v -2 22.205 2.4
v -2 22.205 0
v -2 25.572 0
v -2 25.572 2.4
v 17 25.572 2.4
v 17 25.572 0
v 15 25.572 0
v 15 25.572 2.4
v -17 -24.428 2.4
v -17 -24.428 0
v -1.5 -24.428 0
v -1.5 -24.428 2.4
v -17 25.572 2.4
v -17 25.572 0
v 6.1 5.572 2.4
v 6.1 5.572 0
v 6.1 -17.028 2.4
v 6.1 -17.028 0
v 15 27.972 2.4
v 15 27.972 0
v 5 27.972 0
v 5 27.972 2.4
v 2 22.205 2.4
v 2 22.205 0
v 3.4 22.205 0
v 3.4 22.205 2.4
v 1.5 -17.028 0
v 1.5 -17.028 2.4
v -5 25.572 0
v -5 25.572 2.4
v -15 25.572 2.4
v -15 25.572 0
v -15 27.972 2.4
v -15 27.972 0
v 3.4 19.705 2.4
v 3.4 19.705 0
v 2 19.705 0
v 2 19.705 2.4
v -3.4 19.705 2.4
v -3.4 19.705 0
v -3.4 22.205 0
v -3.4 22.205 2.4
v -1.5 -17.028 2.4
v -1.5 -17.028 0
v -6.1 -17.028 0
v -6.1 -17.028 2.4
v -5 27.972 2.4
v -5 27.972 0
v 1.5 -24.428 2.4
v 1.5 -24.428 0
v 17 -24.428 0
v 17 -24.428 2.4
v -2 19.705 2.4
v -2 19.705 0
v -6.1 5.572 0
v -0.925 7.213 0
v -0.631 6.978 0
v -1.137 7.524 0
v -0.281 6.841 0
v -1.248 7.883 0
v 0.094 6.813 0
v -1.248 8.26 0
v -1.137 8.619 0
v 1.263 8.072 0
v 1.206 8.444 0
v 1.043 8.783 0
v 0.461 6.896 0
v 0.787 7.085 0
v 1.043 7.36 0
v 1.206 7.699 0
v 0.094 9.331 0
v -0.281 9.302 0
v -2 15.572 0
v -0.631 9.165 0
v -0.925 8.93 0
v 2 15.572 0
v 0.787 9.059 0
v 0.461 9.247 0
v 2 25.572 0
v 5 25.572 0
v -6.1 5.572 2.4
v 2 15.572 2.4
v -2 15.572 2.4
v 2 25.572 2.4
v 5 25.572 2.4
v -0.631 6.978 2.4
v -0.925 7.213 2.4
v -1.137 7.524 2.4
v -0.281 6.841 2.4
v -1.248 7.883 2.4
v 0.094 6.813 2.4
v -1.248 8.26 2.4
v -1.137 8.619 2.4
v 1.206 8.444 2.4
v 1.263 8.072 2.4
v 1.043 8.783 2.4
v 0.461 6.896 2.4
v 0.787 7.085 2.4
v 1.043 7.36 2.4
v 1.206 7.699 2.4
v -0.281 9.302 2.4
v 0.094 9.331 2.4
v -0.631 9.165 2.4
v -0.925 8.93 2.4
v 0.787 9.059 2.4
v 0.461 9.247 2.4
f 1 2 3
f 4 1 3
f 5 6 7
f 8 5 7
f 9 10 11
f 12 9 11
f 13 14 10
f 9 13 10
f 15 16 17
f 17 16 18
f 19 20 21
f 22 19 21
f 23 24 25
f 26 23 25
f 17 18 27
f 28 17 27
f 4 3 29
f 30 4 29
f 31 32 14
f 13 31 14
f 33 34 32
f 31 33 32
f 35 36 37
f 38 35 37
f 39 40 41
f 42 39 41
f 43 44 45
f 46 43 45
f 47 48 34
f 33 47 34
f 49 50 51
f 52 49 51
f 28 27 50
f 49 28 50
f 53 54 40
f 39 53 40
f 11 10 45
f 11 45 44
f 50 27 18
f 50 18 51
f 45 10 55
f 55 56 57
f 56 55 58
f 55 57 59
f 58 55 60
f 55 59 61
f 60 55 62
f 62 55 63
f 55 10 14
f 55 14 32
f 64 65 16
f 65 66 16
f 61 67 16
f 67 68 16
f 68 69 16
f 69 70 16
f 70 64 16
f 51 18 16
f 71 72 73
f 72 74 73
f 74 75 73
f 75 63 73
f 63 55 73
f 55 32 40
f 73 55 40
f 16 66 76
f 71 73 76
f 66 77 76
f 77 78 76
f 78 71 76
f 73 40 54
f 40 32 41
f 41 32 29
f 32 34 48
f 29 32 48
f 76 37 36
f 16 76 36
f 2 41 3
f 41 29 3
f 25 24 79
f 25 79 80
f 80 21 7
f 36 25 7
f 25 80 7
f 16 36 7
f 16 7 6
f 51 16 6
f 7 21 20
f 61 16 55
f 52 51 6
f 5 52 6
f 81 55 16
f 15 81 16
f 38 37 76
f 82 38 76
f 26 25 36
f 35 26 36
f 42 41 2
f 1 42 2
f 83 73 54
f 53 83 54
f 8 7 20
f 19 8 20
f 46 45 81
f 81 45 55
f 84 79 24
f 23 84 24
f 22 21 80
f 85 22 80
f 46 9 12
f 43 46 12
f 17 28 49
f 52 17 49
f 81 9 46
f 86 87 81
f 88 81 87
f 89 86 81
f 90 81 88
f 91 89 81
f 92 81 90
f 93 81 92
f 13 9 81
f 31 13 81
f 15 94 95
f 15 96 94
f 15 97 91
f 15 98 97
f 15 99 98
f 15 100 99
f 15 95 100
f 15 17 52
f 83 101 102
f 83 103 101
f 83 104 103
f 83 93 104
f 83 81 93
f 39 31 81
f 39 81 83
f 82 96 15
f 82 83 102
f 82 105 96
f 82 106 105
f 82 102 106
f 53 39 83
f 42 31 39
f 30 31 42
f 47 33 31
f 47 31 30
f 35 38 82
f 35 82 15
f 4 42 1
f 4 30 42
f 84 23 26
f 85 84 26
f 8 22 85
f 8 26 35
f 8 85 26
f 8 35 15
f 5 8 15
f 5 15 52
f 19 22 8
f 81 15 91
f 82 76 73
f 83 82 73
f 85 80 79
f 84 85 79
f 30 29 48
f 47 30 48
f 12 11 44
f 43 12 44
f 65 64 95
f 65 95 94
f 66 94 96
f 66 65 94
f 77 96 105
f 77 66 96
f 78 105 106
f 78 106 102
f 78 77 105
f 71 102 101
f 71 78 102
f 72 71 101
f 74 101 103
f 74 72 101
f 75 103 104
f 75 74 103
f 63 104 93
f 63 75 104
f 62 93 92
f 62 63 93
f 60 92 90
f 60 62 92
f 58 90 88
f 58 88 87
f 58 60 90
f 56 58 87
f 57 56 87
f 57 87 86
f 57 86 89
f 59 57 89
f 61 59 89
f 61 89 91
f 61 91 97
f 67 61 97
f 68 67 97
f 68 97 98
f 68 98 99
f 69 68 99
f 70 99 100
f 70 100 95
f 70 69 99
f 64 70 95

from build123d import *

# Parameters (mm, degrees)
SKETCH1_R           = 1.262505146
BOSS_EXTRUDE1_DEPTH = 2.4


with BuildPart() as part:
    # Sketch1 → Boss-Extrude1 (new body)
    with BuildSketch(Plane.XY):
        Polygon((17, 25.571584313), (15, 25.571584313), (15, 27.971584313), (5, 27.971584313), (5, 25.571584313), (2, 25.571584313), (2, 22.204806168), (3.4, 22.204806168), (3.4, 19.704806168), (2, 19.704806168), (2, 15.571584313), (-2, 15.571584313), (-2, 19.704806168), (-3.4, 19.704806168), (-3.4, 22.204806168), (-2, 22.204806168), (-2, 25.571584313), (-5, 25.571584313), (-5, 27.971584313), (-15, 27.971584313), (-15, 25.571584313), (-17, 25.571584313), (-17, -24.428415687), (-1.5, -24.428415687), (-1.5, -17.028415687), (-6.1, -17.028415687), (-6.1, 5.571584313), (0, 5.571584313), (6.1, 5.571584313), (6.1, -17.028415687), (1.5, -17.028415687), (1.5, -24.428415687), (17, -24.428415687), align=None)
        with Locations((0, 8.071584313)):
            Circle(SKETCH1_R, mode=Mode.SUBTRACT)
    extrude(amount=BOSS_EXTRUDE1_DEPTH)


solid = part.part
